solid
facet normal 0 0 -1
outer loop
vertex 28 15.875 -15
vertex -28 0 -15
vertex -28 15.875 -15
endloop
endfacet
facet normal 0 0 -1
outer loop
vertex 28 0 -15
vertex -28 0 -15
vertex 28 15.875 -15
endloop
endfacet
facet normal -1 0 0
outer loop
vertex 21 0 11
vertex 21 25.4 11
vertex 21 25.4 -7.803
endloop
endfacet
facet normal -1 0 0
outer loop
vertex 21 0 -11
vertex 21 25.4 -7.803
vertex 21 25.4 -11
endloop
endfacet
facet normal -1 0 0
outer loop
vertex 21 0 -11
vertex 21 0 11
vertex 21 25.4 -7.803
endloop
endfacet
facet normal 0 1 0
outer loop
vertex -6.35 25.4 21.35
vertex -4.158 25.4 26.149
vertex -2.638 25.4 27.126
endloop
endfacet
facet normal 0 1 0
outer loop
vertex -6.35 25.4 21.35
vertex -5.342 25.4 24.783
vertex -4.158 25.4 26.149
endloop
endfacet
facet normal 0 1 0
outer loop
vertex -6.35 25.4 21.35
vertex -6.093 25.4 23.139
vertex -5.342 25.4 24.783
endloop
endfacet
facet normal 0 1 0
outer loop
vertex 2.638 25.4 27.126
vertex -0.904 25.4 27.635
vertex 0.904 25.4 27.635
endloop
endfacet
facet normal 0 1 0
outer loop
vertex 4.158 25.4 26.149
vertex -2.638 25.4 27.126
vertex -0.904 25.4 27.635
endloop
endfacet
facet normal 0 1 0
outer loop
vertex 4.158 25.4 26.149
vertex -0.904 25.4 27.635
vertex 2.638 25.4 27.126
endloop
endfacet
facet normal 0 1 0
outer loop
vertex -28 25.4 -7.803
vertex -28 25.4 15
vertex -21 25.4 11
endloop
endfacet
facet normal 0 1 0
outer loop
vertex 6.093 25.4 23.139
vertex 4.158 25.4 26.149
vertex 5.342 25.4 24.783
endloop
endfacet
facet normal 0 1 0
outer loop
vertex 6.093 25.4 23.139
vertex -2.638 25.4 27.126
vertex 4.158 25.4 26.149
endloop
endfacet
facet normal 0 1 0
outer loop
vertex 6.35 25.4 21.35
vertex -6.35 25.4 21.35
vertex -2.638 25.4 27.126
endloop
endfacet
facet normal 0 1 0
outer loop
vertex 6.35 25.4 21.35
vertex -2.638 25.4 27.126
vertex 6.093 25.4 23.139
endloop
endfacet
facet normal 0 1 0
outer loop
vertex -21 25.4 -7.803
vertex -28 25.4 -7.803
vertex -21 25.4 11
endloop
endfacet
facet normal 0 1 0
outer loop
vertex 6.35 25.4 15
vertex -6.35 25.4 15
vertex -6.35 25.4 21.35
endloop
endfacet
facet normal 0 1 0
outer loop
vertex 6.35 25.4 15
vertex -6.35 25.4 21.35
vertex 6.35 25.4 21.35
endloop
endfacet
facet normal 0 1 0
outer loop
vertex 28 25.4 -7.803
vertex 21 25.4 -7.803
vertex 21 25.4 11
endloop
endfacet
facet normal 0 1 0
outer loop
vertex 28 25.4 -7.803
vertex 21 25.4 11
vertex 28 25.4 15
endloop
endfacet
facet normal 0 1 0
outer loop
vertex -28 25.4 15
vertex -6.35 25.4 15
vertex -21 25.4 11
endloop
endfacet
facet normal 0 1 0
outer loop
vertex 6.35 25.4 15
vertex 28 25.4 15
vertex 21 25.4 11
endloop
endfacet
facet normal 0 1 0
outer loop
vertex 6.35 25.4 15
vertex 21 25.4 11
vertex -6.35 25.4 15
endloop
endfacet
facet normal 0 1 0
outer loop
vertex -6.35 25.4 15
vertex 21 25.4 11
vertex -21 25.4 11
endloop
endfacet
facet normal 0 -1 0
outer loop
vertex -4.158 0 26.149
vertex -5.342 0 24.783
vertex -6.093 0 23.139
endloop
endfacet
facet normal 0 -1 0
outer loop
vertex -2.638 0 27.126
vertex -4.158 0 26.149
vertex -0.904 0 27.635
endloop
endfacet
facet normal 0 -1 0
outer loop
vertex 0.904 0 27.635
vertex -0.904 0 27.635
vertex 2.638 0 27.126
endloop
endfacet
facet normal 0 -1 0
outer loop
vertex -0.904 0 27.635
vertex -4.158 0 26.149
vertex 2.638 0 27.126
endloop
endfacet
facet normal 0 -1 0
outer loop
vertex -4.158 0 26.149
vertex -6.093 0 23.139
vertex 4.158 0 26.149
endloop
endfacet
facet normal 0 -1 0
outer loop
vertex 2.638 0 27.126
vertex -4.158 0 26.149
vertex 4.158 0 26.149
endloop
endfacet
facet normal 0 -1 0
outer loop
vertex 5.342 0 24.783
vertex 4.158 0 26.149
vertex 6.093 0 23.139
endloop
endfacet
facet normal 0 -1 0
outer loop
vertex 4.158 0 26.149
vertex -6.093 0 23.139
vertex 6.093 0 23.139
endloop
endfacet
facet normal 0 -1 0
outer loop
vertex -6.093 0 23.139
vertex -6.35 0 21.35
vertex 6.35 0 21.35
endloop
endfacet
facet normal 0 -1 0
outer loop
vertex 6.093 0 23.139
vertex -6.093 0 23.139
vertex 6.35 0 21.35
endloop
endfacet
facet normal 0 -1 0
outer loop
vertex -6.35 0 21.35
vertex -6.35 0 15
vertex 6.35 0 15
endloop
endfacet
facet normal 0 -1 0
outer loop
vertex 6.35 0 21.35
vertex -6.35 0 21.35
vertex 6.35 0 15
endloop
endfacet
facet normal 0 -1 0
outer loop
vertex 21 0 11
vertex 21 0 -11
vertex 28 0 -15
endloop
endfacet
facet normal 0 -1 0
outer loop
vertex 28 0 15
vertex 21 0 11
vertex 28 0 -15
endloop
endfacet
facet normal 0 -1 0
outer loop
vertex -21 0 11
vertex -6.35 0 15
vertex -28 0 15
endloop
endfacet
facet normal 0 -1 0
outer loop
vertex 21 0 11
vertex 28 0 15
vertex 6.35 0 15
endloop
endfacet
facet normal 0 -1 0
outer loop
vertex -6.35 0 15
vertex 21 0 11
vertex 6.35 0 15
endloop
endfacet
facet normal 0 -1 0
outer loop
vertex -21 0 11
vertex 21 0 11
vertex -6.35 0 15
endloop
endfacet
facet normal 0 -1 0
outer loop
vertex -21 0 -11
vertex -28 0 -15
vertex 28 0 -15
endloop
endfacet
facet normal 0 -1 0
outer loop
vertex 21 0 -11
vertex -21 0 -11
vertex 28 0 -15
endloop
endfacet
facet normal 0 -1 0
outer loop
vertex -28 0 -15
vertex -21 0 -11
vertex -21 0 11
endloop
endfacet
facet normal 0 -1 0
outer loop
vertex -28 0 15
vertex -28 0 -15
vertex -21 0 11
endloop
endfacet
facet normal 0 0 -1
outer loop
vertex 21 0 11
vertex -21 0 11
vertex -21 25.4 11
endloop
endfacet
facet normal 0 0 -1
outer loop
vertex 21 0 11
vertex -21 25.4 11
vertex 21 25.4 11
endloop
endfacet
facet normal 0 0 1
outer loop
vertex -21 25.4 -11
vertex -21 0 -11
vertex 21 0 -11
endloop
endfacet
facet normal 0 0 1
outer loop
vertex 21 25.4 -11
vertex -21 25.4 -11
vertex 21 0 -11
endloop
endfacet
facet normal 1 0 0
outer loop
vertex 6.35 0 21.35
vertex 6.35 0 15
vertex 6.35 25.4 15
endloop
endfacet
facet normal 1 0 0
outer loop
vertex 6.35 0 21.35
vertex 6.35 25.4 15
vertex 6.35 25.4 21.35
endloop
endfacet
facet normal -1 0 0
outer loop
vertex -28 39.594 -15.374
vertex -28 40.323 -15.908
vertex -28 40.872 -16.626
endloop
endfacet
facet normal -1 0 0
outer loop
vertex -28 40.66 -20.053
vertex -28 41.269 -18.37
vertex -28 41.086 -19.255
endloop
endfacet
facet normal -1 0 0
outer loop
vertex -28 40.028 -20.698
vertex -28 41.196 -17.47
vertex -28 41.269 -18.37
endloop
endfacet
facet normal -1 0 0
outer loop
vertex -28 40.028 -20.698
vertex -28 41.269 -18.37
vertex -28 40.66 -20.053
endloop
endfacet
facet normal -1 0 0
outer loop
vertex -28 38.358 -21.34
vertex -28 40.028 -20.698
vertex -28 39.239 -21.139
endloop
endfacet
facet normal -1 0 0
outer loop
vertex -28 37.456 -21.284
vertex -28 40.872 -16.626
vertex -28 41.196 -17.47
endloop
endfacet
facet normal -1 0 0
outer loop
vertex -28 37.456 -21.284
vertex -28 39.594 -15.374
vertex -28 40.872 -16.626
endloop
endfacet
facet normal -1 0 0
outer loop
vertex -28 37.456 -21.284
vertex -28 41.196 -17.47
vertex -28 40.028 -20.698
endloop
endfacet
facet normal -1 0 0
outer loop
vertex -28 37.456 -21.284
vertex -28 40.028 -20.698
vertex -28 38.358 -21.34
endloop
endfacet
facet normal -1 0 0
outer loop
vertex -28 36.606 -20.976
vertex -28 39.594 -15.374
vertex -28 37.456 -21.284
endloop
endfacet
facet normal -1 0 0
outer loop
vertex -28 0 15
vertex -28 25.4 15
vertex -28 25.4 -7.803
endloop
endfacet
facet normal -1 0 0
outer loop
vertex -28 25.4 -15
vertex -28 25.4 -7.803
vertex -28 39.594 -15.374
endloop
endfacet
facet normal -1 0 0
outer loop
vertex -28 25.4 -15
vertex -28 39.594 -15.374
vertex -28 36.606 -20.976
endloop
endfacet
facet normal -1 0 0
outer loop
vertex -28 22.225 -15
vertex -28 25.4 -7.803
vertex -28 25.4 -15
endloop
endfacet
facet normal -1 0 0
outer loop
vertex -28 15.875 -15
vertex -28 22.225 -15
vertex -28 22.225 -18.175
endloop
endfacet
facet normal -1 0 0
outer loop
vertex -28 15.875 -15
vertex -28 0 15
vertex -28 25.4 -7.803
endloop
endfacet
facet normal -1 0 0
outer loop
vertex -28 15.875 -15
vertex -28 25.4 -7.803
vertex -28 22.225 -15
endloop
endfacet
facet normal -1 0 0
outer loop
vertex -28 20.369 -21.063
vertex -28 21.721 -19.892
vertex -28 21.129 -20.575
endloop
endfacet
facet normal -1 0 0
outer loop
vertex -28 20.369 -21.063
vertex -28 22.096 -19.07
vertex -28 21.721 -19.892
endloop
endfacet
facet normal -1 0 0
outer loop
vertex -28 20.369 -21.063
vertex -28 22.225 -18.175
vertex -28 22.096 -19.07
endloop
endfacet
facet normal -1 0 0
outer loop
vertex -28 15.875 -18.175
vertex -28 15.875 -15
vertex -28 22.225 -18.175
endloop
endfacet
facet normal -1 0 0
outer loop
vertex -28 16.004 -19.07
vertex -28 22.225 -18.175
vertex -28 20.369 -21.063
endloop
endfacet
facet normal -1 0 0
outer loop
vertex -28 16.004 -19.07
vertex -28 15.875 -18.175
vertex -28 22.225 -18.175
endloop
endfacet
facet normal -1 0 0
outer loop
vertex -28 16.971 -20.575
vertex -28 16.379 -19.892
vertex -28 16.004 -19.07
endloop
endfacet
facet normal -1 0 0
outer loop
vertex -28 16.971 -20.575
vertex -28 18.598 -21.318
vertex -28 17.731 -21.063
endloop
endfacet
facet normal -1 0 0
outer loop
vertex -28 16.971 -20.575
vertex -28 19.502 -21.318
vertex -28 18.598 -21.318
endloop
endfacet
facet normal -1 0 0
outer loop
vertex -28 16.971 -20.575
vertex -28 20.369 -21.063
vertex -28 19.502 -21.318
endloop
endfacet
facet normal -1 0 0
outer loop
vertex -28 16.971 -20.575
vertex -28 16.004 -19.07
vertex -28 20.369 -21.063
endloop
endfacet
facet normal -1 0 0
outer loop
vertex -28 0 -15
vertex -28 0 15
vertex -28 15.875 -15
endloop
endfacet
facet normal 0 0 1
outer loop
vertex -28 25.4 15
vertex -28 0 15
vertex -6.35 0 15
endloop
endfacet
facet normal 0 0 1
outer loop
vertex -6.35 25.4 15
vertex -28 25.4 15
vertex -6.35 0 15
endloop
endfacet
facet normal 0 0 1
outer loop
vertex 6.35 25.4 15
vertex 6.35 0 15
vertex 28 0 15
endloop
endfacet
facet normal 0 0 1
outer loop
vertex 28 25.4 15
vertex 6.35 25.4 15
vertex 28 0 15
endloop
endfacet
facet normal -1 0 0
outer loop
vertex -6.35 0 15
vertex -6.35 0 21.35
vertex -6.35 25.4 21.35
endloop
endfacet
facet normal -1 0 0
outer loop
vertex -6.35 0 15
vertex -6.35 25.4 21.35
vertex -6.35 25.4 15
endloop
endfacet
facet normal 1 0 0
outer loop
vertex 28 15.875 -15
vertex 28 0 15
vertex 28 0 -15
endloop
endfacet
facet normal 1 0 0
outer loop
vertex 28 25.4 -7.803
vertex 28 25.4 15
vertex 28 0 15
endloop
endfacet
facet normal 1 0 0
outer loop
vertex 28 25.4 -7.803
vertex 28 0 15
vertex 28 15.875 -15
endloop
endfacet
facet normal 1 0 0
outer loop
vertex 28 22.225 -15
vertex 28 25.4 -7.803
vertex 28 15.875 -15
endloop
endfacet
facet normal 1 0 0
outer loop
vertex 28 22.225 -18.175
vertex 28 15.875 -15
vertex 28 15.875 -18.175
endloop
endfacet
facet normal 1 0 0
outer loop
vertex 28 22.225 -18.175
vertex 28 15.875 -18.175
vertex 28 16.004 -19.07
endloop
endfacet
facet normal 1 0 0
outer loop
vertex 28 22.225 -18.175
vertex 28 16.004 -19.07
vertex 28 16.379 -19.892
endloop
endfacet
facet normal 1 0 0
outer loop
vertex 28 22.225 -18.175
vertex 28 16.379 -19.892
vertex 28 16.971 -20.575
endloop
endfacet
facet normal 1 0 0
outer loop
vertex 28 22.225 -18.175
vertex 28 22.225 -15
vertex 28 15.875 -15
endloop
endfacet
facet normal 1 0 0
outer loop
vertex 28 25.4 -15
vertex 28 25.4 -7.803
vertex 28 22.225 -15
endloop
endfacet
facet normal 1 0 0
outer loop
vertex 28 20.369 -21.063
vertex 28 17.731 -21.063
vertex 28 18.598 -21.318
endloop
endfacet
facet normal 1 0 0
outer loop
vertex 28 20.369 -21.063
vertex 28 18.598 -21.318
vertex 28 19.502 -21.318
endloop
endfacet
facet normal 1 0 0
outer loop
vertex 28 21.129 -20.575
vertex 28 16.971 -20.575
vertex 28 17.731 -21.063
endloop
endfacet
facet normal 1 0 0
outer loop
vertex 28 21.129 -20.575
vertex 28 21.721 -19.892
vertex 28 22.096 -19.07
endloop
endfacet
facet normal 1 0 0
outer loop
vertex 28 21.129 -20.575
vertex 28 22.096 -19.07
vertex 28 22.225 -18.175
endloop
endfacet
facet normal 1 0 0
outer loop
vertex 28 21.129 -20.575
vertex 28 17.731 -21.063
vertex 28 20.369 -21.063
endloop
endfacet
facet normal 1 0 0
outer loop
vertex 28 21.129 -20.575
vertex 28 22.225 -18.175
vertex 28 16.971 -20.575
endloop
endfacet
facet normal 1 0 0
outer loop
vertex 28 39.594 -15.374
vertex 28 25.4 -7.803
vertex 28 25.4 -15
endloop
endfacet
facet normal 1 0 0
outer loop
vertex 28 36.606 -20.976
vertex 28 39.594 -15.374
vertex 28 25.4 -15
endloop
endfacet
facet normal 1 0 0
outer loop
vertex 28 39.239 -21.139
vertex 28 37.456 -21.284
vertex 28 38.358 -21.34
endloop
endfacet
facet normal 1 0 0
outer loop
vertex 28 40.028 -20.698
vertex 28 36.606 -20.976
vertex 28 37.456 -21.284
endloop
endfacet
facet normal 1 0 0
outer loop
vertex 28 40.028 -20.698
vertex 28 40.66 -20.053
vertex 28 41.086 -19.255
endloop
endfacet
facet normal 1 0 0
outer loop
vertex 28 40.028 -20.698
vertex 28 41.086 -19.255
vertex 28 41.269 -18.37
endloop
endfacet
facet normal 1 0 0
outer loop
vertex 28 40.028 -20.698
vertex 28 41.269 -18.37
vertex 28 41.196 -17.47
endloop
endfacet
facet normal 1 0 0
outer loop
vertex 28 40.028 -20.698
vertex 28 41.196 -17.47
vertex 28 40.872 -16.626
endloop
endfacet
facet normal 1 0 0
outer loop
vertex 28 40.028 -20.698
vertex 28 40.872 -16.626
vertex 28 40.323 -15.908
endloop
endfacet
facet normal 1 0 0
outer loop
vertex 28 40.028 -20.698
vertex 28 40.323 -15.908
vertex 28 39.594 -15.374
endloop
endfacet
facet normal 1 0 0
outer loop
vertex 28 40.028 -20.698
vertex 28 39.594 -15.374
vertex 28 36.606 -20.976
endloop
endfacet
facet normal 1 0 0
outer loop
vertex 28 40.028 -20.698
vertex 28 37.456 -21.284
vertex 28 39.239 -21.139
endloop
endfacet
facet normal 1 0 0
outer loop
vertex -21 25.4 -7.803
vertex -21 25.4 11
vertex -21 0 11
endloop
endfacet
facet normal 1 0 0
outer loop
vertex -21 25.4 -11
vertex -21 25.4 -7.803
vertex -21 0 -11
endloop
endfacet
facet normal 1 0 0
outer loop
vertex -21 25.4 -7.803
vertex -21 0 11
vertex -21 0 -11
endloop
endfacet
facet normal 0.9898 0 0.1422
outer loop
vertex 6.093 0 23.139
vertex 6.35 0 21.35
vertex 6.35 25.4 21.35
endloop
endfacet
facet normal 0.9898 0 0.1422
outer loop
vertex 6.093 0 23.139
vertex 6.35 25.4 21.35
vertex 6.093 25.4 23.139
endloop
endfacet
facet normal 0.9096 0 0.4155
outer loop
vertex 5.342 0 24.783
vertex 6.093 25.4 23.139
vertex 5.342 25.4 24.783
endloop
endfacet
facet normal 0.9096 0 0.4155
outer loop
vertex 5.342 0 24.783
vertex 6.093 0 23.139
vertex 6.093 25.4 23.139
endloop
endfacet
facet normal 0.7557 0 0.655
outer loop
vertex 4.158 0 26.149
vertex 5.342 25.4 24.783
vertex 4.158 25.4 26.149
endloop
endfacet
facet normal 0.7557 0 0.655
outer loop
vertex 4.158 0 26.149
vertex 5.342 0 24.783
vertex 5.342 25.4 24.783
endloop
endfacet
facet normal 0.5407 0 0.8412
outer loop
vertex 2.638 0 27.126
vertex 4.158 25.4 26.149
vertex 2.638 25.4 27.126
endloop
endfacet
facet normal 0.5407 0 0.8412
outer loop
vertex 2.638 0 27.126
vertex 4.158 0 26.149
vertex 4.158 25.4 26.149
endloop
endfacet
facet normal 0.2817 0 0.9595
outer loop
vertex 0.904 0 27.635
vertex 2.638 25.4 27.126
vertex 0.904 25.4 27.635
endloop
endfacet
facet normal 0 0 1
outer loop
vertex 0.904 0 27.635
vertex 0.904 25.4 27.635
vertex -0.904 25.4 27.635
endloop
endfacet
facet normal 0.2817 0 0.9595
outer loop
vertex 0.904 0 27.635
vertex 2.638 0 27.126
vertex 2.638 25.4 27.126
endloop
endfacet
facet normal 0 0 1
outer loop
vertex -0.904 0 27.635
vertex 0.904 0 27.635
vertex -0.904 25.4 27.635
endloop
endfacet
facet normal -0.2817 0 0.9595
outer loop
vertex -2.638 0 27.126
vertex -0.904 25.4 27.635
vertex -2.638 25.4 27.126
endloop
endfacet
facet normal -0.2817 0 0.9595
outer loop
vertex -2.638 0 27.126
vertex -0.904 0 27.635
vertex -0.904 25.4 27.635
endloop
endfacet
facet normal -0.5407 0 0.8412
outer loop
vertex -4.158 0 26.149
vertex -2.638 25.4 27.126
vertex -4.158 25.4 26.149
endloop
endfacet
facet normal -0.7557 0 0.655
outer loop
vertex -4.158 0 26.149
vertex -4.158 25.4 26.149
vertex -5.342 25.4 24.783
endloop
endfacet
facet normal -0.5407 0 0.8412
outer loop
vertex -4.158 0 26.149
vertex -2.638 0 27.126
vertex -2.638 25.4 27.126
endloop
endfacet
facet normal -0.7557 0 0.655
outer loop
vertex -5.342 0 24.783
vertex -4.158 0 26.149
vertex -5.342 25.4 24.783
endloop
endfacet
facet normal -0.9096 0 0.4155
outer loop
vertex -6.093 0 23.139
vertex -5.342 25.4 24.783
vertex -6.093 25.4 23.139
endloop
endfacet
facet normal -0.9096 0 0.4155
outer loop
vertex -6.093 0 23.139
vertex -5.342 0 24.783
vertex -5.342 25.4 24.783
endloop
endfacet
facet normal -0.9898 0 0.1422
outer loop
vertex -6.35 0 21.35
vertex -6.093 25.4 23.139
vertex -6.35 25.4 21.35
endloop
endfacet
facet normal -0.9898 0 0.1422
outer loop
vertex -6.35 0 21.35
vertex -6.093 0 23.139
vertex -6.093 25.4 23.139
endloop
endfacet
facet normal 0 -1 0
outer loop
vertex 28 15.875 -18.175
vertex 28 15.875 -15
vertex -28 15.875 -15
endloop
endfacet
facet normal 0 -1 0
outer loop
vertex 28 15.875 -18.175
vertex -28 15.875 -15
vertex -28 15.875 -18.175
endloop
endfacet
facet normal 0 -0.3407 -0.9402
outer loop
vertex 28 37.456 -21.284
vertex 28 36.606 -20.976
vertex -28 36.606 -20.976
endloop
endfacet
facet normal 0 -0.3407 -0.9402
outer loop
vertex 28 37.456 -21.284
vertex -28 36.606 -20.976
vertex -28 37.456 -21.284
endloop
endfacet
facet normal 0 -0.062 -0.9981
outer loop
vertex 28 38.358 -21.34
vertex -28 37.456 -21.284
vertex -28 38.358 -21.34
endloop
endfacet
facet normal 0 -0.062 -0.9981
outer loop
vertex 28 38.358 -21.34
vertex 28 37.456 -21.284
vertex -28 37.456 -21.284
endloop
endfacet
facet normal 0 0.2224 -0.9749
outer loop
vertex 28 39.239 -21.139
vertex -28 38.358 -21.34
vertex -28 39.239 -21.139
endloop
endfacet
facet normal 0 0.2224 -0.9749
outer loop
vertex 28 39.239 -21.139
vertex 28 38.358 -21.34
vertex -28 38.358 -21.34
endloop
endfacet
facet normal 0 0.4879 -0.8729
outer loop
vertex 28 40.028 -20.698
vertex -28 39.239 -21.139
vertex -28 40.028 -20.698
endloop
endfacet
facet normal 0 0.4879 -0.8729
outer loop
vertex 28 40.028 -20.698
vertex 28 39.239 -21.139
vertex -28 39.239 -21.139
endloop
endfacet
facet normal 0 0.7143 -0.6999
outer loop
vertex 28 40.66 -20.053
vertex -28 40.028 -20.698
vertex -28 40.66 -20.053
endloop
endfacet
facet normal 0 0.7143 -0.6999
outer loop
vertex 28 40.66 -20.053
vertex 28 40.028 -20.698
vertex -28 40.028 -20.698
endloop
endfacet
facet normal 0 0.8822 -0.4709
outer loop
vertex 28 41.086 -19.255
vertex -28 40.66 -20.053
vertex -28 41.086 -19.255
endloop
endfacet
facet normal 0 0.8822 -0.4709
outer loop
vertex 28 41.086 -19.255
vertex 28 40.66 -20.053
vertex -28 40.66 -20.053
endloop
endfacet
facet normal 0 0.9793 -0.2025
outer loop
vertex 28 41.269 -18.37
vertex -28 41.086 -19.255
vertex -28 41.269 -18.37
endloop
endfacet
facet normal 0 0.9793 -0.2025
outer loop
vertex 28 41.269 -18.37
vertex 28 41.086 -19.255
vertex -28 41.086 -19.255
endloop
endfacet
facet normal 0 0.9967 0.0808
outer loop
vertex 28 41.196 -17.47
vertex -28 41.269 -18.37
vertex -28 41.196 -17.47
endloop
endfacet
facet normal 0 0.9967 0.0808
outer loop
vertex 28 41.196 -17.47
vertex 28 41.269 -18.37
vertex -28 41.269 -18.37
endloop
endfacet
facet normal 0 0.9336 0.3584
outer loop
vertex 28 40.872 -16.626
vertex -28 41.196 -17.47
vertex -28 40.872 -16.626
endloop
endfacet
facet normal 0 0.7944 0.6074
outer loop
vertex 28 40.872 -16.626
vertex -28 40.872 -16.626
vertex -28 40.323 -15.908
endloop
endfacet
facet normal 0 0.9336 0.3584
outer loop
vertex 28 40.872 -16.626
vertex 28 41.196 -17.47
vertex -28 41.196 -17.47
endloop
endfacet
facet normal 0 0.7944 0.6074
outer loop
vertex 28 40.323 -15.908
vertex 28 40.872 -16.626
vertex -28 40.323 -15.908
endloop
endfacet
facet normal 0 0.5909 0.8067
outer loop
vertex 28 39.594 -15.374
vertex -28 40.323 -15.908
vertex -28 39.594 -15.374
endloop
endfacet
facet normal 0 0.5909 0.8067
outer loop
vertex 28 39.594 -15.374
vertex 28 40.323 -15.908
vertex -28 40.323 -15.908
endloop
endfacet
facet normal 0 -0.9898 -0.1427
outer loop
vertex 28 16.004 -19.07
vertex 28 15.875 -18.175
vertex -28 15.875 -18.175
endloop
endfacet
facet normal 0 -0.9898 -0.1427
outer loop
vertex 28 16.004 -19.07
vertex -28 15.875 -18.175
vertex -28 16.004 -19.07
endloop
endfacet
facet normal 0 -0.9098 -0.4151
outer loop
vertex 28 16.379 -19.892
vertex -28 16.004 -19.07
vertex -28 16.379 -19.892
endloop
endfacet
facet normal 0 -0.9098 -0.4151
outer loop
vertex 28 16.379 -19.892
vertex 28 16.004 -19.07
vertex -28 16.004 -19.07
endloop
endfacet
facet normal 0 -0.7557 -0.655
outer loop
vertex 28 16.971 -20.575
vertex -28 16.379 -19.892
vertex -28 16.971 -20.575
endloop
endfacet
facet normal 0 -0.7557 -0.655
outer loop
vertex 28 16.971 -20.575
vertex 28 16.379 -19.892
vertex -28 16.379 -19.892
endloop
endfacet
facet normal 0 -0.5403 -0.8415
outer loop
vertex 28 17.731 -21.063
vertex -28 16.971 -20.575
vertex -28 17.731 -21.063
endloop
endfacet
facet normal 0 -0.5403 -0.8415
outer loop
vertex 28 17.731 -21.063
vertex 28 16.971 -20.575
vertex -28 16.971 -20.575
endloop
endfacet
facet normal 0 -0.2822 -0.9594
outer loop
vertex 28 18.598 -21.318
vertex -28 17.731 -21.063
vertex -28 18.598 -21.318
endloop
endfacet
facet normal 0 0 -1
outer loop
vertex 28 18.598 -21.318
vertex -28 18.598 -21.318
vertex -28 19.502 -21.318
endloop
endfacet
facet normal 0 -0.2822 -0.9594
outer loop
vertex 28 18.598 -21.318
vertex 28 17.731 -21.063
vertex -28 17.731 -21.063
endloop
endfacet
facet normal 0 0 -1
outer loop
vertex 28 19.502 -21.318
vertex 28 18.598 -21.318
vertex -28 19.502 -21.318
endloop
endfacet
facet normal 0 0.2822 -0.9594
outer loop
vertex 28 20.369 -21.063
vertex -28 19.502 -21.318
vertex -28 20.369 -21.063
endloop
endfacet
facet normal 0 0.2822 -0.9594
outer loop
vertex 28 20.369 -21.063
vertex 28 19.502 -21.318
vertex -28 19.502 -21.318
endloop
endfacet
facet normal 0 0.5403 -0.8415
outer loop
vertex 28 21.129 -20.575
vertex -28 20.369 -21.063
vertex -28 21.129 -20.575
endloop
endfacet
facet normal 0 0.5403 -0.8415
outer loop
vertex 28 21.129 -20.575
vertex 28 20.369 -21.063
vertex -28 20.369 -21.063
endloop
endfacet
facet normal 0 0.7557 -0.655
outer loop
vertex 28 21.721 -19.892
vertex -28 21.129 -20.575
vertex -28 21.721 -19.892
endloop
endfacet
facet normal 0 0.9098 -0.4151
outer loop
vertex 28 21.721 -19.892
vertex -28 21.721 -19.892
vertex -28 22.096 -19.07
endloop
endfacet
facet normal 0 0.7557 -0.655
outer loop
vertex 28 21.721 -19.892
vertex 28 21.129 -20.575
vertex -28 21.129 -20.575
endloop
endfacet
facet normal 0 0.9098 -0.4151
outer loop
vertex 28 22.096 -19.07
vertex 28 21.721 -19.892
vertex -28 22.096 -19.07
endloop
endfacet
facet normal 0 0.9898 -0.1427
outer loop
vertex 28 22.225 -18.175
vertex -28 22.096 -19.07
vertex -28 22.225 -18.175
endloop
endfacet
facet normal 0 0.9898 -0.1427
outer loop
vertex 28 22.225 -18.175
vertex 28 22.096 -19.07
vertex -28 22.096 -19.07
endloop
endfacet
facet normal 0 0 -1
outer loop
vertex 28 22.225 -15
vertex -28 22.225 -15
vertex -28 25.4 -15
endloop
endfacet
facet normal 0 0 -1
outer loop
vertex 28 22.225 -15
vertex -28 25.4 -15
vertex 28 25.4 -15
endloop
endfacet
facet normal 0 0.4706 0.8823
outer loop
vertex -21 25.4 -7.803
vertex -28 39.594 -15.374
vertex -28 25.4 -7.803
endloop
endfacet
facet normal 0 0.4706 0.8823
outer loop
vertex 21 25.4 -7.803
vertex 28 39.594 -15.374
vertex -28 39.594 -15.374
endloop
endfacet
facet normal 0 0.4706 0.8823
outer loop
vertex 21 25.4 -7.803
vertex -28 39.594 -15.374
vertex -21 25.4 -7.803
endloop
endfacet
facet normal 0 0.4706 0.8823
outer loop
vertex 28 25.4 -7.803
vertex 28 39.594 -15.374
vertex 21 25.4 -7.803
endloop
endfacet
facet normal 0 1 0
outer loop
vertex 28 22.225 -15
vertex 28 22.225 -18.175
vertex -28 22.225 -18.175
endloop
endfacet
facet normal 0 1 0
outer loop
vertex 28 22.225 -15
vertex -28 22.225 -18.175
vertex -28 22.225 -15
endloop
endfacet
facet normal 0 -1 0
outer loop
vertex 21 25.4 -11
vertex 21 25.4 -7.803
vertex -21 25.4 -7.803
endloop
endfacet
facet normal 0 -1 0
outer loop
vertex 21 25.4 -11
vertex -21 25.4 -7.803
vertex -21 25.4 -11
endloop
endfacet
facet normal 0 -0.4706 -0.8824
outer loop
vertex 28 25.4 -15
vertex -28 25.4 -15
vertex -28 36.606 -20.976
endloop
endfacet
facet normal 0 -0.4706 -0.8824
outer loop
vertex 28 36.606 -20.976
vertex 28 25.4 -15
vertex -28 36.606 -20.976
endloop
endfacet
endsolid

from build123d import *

# Parameters (mm, degrees)
SKETCH1_W           = 56
SKETCH1_H           = 30
SKETCH1_W_2         = 42
SKETCH1_H_2         = 22
BOSS_EXTRUDE1_DEPTH = 25.4
BOSS_EXTRUDE2_DEPTH = 56
BOSS_EXTRUDE3_REACH = 67.092
BOSS_EXTRUDE4_DEPTH = 25.4


with BuildPart() as part:
    # Sketch1 → Boss-Extrude1 (new body)
    with BuildSketch(Plane(origin=(0, 0, 0), x_dir=(1, 0, 0), z_dir=(0, 1, 0))):
        Rectangle(SKETCH1_W, SKETCH1_H)
        Rectangle(SKETCH1_W_2, SKETCH1_H_2, mode=Mode.SUBTRACT)
    extrude(amount=BOSS_EXTRUDE1_DEPTH)

    # Sketch2 → Boss-Extrude2 (add)
    with BuildSketch(Plane(origin=(28, 0, 0), x_dir=(0, 0, -1), z_dir=(1, 0, 0))):
        with BuildLine():
            Line((18.175, 22.225), (15, 22.225))
            Line((15, 22.225), (15, 15.875))
            Line((15, 15.875), (18.175, 15.875))
            ThreePointArc((18.175, 15.875), (21.35, 19.05), (18.175, 22.225))
        make_face()
    extrude(amount=-BOSS_EXTRUDE2_DEPTH)

    # Boss-Extrude3: up to this face of the body (flat: up to its plane)
    boss_extrude3_end = Plane(part.part.faces().sort_by_distance((-28, 12.986434698, -0.806465427))[0])
    # Sketch3 → Boss-Extrude3 (add, up to the picked face)
    with BuildSketch(Plane(origin=(28, 0, 0), x_dir=(0, 0, -1), z_dir=(1, 0, 0)), mode=Mode.PRIVATE) as boss_extrude3_sk1:
        with BuildLine():
            Line((15, 25.4), (20.976470588, 36.605882353))
            ThreePointArc((20.976470588, 36.605882353), (19.669117647, 40.901470588), (15.373529412, 39.594117647))
            Line((15.373529412, 39.594117647), (7.803333333, 25.4))
            Line((7.803333333, 25.4), (15, 25.4))
        make_face()
    boss_extrude3_tool1 = split(extrude(boss_extrude3_sk1.sketch, amount=-BOSS_EXTRUDE3_REACH, mode=Mode.PRIVATE), bisect_by=boss_extrude3_end, keep=Keep.BOTH, mode=Mode.PRIVATE)
    add(boss_extrude3_tool1.solids().sort_by(Axis((28, 32.888225, -15.275113), (-1, 0, 0)))[0])

    # Sketch4 → Boss-Extrude4 (add)
    with BuildSketch(Plane.XZ):
        with BuildLine():
            Line((-6.35, 21.35), (-6.35, 15))
            Line((-6.35, 15), (6.35, 15))
            Line((6.35, 15), (6.35, 21.35))
            ThreePointArc((6.35, 21.35), (0, 27.7), (-6.35, 21.35))
        make_face()
    extrude(amount=-BOSS_EXTRUDE4_DEPTH)


solid = part.part
